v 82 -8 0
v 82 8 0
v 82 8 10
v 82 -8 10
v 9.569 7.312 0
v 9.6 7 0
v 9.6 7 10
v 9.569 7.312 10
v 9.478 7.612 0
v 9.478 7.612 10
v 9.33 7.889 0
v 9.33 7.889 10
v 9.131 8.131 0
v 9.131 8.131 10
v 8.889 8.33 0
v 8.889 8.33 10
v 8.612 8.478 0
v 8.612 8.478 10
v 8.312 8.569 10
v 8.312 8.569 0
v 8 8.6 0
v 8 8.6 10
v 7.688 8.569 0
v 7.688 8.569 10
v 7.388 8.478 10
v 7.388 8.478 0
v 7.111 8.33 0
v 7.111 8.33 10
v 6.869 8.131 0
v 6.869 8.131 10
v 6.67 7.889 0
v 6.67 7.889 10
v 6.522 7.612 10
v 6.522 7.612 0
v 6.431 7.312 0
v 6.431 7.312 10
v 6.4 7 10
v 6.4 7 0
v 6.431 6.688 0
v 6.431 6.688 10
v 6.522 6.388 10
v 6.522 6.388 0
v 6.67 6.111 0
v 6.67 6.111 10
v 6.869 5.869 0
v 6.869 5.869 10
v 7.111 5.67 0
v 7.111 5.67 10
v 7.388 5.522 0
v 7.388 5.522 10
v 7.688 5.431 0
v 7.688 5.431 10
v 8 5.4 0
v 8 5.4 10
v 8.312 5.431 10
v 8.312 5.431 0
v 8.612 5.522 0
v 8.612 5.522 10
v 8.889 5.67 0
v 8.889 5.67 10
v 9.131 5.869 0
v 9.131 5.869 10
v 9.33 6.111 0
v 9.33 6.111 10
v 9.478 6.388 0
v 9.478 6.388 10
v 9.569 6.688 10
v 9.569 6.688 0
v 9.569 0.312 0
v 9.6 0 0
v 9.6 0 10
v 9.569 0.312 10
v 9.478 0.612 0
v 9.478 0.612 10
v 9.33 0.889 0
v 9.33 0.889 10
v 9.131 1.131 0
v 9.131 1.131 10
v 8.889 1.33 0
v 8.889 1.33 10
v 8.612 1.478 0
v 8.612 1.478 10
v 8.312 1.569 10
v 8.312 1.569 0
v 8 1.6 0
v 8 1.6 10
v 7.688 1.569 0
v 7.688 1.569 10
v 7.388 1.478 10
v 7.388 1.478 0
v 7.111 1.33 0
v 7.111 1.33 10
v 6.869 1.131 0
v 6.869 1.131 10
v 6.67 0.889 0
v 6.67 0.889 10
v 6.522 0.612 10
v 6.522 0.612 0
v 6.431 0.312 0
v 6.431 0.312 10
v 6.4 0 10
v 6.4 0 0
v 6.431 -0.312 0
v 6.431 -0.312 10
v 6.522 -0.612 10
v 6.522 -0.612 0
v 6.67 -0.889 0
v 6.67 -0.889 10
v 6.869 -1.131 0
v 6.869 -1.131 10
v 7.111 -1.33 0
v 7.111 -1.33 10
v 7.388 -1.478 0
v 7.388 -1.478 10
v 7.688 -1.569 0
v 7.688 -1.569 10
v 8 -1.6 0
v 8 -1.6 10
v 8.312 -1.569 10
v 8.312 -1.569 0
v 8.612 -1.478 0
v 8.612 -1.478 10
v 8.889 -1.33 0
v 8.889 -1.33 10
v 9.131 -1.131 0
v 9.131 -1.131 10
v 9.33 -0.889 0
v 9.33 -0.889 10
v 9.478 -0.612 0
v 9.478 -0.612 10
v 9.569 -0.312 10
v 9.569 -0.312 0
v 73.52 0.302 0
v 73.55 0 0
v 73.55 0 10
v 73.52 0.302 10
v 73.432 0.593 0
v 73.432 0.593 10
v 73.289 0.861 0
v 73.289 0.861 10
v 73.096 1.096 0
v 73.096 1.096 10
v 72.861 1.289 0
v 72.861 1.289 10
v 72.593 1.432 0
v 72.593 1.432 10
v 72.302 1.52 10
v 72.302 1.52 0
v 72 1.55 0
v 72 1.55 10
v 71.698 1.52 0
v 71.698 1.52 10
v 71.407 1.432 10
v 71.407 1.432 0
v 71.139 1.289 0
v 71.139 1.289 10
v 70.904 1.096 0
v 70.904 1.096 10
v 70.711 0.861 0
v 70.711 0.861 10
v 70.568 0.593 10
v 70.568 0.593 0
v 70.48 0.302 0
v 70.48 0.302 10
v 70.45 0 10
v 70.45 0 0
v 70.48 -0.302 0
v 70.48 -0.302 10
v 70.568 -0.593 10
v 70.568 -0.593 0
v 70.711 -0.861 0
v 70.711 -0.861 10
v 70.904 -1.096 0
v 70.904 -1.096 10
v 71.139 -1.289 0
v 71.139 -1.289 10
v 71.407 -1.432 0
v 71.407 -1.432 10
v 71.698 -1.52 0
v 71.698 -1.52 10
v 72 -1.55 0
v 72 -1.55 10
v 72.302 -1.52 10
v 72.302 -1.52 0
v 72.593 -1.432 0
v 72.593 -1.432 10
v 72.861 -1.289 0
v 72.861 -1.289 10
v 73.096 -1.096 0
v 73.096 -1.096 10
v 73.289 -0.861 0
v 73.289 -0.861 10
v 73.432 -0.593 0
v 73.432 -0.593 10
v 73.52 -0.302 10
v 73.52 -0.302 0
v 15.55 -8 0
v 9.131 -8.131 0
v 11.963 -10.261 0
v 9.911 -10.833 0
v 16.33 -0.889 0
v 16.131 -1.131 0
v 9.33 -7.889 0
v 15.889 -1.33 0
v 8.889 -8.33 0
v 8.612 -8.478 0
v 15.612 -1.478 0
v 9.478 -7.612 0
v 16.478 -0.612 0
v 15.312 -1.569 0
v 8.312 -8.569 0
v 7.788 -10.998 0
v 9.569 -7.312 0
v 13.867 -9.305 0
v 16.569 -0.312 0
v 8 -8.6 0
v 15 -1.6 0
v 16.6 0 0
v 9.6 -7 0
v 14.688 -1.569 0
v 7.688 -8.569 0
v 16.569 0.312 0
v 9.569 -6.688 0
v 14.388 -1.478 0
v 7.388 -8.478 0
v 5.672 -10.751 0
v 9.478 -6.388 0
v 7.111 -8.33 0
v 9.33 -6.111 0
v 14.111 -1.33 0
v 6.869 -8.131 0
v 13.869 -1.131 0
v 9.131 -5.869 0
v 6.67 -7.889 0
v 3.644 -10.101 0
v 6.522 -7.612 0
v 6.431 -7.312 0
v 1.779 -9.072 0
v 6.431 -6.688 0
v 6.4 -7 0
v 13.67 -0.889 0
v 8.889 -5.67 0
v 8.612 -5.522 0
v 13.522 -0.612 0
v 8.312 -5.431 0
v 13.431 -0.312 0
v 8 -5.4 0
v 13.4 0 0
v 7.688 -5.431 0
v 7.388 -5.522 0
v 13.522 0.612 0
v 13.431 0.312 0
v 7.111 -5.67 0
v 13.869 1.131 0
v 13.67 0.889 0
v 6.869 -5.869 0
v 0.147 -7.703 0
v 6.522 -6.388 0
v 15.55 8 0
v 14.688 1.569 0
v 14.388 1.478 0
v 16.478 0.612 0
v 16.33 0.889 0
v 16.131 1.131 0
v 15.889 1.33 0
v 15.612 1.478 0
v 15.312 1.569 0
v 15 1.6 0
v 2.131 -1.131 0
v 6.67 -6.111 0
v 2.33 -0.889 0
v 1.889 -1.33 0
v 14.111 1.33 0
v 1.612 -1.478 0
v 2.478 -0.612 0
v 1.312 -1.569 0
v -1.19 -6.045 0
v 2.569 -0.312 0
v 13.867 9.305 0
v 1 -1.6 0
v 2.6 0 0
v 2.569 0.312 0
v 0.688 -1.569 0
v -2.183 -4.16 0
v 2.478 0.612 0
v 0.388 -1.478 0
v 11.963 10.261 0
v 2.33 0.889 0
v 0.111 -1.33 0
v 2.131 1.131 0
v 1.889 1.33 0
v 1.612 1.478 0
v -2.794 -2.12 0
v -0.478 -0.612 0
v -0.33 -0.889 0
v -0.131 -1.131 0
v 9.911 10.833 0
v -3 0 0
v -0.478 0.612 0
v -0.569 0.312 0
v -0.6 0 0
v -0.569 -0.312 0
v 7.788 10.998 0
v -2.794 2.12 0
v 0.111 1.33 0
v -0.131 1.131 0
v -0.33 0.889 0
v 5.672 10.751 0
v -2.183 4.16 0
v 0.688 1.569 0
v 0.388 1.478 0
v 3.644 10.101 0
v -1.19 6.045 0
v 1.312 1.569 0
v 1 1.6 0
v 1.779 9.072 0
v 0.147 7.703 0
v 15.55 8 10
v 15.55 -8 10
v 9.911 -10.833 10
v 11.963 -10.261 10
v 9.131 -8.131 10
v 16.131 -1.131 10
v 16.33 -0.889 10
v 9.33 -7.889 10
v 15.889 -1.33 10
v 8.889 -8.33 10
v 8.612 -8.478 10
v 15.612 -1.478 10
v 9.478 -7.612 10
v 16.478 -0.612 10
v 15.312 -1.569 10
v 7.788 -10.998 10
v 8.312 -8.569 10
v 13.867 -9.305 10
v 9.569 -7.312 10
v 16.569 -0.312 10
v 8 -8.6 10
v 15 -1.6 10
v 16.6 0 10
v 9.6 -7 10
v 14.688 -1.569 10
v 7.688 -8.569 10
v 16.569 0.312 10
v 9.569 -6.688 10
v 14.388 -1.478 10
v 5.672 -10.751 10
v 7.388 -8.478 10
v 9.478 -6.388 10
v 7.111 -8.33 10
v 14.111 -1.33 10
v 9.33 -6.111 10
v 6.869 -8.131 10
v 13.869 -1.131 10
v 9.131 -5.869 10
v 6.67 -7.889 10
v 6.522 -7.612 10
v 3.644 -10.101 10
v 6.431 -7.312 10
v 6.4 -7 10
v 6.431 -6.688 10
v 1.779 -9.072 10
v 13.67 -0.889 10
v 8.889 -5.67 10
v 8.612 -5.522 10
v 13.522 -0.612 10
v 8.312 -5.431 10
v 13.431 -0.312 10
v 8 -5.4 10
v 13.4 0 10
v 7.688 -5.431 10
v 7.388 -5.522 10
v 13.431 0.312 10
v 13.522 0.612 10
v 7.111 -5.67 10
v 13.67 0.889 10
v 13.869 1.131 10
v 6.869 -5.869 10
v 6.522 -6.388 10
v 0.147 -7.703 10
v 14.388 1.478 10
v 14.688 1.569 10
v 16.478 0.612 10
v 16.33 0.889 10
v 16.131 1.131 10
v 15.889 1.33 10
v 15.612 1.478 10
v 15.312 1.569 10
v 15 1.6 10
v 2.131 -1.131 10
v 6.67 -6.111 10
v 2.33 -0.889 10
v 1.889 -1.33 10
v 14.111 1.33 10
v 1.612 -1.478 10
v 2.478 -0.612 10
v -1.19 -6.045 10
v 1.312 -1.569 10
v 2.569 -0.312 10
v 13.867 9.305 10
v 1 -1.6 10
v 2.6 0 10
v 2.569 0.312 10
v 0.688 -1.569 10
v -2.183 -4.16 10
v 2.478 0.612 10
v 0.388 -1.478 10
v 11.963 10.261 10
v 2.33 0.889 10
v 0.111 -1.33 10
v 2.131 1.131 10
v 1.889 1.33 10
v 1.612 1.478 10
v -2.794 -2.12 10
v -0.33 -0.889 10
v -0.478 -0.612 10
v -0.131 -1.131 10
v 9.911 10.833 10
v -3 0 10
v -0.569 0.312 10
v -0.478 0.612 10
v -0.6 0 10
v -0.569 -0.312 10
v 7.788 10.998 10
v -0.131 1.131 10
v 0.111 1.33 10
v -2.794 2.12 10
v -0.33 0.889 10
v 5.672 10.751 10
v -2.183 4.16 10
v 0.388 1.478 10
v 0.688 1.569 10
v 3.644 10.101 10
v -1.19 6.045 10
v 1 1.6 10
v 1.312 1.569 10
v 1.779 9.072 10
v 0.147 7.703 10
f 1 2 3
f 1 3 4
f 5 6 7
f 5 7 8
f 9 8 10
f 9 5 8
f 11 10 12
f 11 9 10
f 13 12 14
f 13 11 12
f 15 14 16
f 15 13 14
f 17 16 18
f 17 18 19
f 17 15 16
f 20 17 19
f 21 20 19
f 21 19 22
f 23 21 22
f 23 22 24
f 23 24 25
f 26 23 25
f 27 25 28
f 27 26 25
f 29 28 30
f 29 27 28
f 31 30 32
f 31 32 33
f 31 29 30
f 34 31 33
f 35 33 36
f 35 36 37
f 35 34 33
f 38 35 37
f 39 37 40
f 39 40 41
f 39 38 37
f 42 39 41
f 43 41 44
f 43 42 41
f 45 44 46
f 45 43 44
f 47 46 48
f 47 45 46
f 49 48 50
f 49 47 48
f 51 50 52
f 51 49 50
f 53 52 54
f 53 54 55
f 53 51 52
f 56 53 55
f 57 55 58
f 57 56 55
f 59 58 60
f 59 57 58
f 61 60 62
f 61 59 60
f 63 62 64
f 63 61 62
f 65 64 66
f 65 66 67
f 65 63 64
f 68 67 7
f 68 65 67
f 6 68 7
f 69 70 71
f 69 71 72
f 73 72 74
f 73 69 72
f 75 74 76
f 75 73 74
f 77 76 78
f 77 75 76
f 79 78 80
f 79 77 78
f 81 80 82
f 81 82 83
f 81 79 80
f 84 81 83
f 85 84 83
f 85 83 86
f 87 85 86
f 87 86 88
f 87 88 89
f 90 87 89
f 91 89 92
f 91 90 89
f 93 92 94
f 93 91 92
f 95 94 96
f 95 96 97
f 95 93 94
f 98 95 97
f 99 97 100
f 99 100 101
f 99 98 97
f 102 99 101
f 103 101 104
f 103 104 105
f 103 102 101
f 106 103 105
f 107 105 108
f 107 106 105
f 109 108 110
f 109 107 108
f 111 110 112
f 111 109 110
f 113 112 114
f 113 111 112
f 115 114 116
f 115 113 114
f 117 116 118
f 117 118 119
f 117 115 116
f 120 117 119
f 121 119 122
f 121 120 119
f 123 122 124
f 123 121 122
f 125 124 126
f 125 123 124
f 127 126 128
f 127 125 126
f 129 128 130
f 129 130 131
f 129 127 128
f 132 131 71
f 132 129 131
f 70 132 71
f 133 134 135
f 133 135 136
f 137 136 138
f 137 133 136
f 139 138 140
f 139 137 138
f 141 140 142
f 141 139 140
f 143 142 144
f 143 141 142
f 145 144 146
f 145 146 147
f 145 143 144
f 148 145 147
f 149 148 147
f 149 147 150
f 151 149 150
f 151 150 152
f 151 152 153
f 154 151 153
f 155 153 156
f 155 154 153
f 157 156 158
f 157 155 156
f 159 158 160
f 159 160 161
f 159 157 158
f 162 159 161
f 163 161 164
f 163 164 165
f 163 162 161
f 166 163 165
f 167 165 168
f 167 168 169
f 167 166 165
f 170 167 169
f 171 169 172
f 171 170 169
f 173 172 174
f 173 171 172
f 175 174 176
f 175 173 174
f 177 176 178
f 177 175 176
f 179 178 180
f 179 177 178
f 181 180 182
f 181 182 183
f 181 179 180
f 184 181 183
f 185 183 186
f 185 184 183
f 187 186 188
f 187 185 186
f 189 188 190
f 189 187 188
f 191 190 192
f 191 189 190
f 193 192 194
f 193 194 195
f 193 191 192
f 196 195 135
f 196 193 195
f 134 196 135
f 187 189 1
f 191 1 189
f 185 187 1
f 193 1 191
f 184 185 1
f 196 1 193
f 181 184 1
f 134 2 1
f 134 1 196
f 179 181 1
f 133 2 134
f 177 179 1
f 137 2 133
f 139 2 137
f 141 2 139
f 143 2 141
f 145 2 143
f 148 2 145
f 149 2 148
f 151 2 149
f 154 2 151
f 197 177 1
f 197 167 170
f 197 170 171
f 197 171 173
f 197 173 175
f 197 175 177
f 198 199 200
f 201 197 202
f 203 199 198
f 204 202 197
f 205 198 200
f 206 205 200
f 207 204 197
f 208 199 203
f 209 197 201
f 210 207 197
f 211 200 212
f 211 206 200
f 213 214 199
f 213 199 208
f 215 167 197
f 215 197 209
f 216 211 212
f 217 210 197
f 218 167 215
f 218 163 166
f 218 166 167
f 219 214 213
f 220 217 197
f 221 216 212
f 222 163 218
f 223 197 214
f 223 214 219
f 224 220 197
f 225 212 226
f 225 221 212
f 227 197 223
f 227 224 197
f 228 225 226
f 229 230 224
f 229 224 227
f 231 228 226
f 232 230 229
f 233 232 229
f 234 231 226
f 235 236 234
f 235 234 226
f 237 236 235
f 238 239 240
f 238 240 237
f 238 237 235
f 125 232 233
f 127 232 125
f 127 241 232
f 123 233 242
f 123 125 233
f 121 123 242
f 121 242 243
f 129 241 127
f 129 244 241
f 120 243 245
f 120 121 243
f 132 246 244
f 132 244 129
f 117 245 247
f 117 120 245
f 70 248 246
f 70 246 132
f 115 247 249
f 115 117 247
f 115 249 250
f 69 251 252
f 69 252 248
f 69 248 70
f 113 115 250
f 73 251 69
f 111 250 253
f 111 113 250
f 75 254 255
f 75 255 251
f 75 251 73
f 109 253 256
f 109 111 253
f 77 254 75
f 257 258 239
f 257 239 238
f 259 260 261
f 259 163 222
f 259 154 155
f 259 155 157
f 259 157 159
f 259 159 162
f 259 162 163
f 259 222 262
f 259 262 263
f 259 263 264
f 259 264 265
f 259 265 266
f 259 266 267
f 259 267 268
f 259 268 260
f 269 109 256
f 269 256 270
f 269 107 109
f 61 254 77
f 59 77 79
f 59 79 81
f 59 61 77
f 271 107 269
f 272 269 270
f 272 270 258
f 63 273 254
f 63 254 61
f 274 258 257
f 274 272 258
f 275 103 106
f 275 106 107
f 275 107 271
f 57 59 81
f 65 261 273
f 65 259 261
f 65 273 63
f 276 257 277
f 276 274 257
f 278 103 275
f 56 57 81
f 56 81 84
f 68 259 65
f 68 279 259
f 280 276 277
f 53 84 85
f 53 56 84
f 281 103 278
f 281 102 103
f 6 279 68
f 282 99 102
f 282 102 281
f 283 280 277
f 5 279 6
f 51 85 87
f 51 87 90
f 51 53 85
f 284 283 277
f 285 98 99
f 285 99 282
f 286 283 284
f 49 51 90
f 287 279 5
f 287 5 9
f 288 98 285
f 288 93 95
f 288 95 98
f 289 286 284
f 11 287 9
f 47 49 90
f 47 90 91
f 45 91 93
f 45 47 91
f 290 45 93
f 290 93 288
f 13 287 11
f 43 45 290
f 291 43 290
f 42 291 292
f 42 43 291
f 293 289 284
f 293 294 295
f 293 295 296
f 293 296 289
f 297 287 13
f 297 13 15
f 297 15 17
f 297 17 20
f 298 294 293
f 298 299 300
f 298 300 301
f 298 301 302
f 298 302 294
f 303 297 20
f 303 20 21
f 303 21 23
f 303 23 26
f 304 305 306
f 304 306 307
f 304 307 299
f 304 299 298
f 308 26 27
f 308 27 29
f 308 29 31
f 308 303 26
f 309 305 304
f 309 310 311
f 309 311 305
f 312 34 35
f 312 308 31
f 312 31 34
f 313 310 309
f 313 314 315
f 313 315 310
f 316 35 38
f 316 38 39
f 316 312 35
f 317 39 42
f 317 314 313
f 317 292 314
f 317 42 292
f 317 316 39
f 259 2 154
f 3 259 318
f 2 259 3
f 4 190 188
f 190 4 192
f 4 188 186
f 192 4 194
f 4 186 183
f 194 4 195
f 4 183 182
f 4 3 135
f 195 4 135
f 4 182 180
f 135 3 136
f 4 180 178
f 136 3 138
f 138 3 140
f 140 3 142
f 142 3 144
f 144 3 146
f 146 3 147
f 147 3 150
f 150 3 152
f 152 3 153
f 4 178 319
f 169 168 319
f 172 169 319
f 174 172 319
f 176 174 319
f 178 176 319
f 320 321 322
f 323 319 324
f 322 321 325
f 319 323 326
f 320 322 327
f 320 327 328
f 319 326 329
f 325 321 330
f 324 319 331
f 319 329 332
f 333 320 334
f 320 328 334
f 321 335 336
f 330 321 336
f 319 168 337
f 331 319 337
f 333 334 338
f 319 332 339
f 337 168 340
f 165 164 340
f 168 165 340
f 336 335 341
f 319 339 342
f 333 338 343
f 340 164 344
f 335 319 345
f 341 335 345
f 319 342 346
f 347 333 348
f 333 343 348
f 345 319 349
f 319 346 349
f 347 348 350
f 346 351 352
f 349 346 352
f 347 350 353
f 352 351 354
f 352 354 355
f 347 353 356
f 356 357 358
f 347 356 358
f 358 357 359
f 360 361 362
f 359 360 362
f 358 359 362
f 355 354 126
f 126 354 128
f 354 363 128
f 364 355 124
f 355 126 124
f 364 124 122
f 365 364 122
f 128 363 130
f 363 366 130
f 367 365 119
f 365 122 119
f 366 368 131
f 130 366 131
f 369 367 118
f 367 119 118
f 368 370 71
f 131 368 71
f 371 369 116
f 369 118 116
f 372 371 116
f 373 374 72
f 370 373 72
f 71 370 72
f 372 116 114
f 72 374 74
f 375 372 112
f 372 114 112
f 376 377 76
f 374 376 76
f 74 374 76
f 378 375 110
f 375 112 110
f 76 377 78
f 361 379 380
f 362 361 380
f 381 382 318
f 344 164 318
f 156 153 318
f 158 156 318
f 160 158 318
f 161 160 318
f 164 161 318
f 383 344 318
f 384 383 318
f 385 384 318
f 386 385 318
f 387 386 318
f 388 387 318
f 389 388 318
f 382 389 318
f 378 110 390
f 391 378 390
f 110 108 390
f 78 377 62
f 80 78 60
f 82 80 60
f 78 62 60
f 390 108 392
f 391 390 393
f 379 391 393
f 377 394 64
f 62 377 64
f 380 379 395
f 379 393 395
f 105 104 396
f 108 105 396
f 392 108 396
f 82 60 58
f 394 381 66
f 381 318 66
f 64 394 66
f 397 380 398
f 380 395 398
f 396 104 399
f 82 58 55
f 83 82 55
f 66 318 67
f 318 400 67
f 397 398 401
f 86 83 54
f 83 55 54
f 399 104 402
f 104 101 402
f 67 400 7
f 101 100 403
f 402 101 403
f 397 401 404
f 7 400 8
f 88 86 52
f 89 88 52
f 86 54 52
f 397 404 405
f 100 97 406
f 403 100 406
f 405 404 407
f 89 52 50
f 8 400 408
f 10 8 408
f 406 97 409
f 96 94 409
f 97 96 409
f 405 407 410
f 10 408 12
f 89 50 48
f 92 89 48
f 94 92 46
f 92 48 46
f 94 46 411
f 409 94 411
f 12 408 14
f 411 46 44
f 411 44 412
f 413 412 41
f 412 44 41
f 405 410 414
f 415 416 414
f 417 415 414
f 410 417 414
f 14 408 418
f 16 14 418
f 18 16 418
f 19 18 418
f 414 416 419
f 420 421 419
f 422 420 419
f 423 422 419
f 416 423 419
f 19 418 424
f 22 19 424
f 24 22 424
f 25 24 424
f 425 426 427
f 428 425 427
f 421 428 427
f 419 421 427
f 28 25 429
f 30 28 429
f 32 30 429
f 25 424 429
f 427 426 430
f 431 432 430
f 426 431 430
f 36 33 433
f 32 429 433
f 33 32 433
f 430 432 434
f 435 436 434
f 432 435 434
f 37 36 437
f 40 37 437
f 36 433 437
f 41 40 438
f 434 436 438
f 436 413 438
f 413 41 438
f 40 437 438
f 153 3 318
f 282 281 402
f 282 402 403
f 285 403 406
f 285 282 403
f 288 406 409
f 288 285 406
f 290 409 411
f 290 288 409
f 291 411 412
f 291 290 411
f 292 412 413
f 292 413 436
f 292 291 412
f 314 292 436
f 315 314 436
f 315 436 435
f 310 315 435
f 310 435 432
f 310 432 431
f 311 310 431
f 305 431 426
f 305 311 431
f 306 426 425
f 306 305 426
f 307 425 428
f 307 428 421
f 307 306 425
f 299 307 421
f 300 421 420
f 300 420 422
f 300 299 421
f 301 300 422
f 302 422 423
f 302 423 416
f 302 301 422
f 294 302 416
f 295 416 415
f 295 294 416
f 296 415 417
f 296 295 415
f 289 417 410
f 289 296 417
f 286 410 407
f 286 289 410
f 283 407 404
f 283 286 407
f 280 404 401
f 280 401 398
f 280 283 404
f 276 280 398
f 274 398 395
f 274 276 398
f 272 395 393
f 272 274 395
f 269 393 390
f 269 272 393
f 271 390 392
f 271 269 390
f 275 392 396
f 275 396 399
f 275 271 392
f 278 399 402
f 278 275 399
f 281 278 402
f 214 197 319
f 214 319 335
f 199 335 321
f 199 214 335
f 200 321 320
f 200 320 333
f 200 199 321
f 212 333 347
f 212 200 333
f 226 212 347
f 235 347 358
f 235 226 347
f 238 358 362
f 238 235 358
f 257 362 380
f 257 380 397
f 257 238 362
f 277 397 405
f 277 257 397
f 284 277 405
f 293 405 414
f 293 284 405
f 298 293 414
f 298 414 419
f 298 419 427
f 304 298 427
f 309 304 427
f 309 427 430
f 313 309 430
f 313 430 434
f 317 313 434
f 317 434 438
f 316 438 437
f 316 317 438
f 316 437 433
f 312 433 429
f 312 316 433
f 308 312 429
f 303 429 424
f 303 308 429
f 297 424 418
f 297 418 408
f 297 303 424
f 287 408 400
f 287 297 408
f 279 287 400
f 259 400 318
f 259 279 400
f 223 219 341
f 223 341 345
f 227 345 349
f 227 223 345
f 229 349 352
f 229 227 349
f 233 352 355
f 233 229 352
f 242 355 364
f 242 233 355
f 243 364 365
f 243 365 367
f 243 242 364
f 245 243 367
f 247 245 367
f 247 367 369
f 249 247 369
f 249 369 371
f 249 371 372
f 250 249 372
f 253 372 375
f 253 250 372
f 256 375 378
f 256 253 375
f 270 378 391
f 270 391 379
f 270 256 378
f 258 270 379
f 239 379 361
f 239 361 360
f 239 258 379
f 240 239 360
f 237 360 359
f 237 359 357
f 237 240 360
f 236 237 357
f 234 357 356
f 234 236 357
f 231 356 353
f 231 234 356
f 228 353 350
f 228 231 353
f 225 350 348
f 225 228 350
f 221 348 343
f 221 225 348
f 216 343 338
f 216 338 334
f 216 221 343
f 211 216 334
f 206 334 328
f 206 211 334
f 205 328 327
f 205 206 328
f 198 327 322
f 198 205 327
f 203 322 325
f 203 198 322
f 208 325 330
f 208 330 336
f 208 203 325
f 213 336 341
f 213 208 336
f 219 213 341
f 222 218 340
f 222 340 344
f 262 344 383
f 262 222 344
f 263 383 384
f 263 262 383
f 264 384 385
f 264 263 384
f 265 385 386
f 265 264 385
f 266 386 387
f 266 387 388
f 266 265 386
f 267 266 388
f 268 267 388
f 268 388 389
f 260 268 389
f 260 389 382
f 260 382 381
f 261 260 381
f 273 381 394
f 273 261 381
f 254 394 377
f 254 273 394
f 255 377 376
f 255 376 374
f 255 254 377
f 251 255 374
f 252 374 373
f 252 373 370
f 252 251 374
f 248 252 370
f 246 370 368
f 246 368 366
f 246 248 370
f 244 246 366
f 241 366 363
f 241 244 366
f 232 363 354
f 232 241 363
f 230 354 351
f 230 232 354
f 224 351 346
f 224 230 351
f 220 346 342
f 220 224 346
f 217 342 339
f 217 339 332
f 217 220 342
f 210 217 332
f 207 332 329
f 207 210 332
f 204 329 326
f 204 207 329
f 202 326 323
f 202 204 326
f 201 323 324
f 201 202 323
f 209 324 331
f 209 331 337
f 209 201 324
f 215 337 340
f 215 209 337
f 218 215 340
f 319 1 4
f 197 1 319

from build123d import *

# Parameters (mm, degrees)
SKETCH1_R           = 1.6
SKETCH1_R_2         = 1.55
BOSS_EXTRUDE1_DEPTH = 10


with BuildPart() as part:
    # Sketch1 → Boss-Extrude1 (new body)
    with BuildSketch(Plane.XY):
        with BuildLine():
            Line((82, 8), (82, -8))
            Line((82, -8), (15.549834435, -8))
            ThreePointArc((15.549834435, -8), (-3, 0), (15.549834435, 8))
            Line((15.549834435, 8), (82, 8))
        make_face()
        with Locations((8, 7)):
            Circle(SKETCH1_R, mode=Mode.SUBTRACT)
        with Locations((1, 0)):
            Circle(SKETCH1_R, mode=Mode.SUBTRACT)
        with Locations((8, -7)):
            Circle(SKETCH1_R, mode=Mode.SUBTRACT)
        with Locations((15, 0)):
            Circle(SKETCH1_R, mode=Mode.SUBTRACT)
        with Locations((8, 0)):
            Circle(SKETCH1_R, mode=Mode.SUBTRACT)
        with Locations((72, 0)):
            Circle(SKETCH1_R_2, mode=Mode.SUBTRACT)
    extrude(amount=BOSS_EXTRUDE1_DEPTH)


solid = part.part
